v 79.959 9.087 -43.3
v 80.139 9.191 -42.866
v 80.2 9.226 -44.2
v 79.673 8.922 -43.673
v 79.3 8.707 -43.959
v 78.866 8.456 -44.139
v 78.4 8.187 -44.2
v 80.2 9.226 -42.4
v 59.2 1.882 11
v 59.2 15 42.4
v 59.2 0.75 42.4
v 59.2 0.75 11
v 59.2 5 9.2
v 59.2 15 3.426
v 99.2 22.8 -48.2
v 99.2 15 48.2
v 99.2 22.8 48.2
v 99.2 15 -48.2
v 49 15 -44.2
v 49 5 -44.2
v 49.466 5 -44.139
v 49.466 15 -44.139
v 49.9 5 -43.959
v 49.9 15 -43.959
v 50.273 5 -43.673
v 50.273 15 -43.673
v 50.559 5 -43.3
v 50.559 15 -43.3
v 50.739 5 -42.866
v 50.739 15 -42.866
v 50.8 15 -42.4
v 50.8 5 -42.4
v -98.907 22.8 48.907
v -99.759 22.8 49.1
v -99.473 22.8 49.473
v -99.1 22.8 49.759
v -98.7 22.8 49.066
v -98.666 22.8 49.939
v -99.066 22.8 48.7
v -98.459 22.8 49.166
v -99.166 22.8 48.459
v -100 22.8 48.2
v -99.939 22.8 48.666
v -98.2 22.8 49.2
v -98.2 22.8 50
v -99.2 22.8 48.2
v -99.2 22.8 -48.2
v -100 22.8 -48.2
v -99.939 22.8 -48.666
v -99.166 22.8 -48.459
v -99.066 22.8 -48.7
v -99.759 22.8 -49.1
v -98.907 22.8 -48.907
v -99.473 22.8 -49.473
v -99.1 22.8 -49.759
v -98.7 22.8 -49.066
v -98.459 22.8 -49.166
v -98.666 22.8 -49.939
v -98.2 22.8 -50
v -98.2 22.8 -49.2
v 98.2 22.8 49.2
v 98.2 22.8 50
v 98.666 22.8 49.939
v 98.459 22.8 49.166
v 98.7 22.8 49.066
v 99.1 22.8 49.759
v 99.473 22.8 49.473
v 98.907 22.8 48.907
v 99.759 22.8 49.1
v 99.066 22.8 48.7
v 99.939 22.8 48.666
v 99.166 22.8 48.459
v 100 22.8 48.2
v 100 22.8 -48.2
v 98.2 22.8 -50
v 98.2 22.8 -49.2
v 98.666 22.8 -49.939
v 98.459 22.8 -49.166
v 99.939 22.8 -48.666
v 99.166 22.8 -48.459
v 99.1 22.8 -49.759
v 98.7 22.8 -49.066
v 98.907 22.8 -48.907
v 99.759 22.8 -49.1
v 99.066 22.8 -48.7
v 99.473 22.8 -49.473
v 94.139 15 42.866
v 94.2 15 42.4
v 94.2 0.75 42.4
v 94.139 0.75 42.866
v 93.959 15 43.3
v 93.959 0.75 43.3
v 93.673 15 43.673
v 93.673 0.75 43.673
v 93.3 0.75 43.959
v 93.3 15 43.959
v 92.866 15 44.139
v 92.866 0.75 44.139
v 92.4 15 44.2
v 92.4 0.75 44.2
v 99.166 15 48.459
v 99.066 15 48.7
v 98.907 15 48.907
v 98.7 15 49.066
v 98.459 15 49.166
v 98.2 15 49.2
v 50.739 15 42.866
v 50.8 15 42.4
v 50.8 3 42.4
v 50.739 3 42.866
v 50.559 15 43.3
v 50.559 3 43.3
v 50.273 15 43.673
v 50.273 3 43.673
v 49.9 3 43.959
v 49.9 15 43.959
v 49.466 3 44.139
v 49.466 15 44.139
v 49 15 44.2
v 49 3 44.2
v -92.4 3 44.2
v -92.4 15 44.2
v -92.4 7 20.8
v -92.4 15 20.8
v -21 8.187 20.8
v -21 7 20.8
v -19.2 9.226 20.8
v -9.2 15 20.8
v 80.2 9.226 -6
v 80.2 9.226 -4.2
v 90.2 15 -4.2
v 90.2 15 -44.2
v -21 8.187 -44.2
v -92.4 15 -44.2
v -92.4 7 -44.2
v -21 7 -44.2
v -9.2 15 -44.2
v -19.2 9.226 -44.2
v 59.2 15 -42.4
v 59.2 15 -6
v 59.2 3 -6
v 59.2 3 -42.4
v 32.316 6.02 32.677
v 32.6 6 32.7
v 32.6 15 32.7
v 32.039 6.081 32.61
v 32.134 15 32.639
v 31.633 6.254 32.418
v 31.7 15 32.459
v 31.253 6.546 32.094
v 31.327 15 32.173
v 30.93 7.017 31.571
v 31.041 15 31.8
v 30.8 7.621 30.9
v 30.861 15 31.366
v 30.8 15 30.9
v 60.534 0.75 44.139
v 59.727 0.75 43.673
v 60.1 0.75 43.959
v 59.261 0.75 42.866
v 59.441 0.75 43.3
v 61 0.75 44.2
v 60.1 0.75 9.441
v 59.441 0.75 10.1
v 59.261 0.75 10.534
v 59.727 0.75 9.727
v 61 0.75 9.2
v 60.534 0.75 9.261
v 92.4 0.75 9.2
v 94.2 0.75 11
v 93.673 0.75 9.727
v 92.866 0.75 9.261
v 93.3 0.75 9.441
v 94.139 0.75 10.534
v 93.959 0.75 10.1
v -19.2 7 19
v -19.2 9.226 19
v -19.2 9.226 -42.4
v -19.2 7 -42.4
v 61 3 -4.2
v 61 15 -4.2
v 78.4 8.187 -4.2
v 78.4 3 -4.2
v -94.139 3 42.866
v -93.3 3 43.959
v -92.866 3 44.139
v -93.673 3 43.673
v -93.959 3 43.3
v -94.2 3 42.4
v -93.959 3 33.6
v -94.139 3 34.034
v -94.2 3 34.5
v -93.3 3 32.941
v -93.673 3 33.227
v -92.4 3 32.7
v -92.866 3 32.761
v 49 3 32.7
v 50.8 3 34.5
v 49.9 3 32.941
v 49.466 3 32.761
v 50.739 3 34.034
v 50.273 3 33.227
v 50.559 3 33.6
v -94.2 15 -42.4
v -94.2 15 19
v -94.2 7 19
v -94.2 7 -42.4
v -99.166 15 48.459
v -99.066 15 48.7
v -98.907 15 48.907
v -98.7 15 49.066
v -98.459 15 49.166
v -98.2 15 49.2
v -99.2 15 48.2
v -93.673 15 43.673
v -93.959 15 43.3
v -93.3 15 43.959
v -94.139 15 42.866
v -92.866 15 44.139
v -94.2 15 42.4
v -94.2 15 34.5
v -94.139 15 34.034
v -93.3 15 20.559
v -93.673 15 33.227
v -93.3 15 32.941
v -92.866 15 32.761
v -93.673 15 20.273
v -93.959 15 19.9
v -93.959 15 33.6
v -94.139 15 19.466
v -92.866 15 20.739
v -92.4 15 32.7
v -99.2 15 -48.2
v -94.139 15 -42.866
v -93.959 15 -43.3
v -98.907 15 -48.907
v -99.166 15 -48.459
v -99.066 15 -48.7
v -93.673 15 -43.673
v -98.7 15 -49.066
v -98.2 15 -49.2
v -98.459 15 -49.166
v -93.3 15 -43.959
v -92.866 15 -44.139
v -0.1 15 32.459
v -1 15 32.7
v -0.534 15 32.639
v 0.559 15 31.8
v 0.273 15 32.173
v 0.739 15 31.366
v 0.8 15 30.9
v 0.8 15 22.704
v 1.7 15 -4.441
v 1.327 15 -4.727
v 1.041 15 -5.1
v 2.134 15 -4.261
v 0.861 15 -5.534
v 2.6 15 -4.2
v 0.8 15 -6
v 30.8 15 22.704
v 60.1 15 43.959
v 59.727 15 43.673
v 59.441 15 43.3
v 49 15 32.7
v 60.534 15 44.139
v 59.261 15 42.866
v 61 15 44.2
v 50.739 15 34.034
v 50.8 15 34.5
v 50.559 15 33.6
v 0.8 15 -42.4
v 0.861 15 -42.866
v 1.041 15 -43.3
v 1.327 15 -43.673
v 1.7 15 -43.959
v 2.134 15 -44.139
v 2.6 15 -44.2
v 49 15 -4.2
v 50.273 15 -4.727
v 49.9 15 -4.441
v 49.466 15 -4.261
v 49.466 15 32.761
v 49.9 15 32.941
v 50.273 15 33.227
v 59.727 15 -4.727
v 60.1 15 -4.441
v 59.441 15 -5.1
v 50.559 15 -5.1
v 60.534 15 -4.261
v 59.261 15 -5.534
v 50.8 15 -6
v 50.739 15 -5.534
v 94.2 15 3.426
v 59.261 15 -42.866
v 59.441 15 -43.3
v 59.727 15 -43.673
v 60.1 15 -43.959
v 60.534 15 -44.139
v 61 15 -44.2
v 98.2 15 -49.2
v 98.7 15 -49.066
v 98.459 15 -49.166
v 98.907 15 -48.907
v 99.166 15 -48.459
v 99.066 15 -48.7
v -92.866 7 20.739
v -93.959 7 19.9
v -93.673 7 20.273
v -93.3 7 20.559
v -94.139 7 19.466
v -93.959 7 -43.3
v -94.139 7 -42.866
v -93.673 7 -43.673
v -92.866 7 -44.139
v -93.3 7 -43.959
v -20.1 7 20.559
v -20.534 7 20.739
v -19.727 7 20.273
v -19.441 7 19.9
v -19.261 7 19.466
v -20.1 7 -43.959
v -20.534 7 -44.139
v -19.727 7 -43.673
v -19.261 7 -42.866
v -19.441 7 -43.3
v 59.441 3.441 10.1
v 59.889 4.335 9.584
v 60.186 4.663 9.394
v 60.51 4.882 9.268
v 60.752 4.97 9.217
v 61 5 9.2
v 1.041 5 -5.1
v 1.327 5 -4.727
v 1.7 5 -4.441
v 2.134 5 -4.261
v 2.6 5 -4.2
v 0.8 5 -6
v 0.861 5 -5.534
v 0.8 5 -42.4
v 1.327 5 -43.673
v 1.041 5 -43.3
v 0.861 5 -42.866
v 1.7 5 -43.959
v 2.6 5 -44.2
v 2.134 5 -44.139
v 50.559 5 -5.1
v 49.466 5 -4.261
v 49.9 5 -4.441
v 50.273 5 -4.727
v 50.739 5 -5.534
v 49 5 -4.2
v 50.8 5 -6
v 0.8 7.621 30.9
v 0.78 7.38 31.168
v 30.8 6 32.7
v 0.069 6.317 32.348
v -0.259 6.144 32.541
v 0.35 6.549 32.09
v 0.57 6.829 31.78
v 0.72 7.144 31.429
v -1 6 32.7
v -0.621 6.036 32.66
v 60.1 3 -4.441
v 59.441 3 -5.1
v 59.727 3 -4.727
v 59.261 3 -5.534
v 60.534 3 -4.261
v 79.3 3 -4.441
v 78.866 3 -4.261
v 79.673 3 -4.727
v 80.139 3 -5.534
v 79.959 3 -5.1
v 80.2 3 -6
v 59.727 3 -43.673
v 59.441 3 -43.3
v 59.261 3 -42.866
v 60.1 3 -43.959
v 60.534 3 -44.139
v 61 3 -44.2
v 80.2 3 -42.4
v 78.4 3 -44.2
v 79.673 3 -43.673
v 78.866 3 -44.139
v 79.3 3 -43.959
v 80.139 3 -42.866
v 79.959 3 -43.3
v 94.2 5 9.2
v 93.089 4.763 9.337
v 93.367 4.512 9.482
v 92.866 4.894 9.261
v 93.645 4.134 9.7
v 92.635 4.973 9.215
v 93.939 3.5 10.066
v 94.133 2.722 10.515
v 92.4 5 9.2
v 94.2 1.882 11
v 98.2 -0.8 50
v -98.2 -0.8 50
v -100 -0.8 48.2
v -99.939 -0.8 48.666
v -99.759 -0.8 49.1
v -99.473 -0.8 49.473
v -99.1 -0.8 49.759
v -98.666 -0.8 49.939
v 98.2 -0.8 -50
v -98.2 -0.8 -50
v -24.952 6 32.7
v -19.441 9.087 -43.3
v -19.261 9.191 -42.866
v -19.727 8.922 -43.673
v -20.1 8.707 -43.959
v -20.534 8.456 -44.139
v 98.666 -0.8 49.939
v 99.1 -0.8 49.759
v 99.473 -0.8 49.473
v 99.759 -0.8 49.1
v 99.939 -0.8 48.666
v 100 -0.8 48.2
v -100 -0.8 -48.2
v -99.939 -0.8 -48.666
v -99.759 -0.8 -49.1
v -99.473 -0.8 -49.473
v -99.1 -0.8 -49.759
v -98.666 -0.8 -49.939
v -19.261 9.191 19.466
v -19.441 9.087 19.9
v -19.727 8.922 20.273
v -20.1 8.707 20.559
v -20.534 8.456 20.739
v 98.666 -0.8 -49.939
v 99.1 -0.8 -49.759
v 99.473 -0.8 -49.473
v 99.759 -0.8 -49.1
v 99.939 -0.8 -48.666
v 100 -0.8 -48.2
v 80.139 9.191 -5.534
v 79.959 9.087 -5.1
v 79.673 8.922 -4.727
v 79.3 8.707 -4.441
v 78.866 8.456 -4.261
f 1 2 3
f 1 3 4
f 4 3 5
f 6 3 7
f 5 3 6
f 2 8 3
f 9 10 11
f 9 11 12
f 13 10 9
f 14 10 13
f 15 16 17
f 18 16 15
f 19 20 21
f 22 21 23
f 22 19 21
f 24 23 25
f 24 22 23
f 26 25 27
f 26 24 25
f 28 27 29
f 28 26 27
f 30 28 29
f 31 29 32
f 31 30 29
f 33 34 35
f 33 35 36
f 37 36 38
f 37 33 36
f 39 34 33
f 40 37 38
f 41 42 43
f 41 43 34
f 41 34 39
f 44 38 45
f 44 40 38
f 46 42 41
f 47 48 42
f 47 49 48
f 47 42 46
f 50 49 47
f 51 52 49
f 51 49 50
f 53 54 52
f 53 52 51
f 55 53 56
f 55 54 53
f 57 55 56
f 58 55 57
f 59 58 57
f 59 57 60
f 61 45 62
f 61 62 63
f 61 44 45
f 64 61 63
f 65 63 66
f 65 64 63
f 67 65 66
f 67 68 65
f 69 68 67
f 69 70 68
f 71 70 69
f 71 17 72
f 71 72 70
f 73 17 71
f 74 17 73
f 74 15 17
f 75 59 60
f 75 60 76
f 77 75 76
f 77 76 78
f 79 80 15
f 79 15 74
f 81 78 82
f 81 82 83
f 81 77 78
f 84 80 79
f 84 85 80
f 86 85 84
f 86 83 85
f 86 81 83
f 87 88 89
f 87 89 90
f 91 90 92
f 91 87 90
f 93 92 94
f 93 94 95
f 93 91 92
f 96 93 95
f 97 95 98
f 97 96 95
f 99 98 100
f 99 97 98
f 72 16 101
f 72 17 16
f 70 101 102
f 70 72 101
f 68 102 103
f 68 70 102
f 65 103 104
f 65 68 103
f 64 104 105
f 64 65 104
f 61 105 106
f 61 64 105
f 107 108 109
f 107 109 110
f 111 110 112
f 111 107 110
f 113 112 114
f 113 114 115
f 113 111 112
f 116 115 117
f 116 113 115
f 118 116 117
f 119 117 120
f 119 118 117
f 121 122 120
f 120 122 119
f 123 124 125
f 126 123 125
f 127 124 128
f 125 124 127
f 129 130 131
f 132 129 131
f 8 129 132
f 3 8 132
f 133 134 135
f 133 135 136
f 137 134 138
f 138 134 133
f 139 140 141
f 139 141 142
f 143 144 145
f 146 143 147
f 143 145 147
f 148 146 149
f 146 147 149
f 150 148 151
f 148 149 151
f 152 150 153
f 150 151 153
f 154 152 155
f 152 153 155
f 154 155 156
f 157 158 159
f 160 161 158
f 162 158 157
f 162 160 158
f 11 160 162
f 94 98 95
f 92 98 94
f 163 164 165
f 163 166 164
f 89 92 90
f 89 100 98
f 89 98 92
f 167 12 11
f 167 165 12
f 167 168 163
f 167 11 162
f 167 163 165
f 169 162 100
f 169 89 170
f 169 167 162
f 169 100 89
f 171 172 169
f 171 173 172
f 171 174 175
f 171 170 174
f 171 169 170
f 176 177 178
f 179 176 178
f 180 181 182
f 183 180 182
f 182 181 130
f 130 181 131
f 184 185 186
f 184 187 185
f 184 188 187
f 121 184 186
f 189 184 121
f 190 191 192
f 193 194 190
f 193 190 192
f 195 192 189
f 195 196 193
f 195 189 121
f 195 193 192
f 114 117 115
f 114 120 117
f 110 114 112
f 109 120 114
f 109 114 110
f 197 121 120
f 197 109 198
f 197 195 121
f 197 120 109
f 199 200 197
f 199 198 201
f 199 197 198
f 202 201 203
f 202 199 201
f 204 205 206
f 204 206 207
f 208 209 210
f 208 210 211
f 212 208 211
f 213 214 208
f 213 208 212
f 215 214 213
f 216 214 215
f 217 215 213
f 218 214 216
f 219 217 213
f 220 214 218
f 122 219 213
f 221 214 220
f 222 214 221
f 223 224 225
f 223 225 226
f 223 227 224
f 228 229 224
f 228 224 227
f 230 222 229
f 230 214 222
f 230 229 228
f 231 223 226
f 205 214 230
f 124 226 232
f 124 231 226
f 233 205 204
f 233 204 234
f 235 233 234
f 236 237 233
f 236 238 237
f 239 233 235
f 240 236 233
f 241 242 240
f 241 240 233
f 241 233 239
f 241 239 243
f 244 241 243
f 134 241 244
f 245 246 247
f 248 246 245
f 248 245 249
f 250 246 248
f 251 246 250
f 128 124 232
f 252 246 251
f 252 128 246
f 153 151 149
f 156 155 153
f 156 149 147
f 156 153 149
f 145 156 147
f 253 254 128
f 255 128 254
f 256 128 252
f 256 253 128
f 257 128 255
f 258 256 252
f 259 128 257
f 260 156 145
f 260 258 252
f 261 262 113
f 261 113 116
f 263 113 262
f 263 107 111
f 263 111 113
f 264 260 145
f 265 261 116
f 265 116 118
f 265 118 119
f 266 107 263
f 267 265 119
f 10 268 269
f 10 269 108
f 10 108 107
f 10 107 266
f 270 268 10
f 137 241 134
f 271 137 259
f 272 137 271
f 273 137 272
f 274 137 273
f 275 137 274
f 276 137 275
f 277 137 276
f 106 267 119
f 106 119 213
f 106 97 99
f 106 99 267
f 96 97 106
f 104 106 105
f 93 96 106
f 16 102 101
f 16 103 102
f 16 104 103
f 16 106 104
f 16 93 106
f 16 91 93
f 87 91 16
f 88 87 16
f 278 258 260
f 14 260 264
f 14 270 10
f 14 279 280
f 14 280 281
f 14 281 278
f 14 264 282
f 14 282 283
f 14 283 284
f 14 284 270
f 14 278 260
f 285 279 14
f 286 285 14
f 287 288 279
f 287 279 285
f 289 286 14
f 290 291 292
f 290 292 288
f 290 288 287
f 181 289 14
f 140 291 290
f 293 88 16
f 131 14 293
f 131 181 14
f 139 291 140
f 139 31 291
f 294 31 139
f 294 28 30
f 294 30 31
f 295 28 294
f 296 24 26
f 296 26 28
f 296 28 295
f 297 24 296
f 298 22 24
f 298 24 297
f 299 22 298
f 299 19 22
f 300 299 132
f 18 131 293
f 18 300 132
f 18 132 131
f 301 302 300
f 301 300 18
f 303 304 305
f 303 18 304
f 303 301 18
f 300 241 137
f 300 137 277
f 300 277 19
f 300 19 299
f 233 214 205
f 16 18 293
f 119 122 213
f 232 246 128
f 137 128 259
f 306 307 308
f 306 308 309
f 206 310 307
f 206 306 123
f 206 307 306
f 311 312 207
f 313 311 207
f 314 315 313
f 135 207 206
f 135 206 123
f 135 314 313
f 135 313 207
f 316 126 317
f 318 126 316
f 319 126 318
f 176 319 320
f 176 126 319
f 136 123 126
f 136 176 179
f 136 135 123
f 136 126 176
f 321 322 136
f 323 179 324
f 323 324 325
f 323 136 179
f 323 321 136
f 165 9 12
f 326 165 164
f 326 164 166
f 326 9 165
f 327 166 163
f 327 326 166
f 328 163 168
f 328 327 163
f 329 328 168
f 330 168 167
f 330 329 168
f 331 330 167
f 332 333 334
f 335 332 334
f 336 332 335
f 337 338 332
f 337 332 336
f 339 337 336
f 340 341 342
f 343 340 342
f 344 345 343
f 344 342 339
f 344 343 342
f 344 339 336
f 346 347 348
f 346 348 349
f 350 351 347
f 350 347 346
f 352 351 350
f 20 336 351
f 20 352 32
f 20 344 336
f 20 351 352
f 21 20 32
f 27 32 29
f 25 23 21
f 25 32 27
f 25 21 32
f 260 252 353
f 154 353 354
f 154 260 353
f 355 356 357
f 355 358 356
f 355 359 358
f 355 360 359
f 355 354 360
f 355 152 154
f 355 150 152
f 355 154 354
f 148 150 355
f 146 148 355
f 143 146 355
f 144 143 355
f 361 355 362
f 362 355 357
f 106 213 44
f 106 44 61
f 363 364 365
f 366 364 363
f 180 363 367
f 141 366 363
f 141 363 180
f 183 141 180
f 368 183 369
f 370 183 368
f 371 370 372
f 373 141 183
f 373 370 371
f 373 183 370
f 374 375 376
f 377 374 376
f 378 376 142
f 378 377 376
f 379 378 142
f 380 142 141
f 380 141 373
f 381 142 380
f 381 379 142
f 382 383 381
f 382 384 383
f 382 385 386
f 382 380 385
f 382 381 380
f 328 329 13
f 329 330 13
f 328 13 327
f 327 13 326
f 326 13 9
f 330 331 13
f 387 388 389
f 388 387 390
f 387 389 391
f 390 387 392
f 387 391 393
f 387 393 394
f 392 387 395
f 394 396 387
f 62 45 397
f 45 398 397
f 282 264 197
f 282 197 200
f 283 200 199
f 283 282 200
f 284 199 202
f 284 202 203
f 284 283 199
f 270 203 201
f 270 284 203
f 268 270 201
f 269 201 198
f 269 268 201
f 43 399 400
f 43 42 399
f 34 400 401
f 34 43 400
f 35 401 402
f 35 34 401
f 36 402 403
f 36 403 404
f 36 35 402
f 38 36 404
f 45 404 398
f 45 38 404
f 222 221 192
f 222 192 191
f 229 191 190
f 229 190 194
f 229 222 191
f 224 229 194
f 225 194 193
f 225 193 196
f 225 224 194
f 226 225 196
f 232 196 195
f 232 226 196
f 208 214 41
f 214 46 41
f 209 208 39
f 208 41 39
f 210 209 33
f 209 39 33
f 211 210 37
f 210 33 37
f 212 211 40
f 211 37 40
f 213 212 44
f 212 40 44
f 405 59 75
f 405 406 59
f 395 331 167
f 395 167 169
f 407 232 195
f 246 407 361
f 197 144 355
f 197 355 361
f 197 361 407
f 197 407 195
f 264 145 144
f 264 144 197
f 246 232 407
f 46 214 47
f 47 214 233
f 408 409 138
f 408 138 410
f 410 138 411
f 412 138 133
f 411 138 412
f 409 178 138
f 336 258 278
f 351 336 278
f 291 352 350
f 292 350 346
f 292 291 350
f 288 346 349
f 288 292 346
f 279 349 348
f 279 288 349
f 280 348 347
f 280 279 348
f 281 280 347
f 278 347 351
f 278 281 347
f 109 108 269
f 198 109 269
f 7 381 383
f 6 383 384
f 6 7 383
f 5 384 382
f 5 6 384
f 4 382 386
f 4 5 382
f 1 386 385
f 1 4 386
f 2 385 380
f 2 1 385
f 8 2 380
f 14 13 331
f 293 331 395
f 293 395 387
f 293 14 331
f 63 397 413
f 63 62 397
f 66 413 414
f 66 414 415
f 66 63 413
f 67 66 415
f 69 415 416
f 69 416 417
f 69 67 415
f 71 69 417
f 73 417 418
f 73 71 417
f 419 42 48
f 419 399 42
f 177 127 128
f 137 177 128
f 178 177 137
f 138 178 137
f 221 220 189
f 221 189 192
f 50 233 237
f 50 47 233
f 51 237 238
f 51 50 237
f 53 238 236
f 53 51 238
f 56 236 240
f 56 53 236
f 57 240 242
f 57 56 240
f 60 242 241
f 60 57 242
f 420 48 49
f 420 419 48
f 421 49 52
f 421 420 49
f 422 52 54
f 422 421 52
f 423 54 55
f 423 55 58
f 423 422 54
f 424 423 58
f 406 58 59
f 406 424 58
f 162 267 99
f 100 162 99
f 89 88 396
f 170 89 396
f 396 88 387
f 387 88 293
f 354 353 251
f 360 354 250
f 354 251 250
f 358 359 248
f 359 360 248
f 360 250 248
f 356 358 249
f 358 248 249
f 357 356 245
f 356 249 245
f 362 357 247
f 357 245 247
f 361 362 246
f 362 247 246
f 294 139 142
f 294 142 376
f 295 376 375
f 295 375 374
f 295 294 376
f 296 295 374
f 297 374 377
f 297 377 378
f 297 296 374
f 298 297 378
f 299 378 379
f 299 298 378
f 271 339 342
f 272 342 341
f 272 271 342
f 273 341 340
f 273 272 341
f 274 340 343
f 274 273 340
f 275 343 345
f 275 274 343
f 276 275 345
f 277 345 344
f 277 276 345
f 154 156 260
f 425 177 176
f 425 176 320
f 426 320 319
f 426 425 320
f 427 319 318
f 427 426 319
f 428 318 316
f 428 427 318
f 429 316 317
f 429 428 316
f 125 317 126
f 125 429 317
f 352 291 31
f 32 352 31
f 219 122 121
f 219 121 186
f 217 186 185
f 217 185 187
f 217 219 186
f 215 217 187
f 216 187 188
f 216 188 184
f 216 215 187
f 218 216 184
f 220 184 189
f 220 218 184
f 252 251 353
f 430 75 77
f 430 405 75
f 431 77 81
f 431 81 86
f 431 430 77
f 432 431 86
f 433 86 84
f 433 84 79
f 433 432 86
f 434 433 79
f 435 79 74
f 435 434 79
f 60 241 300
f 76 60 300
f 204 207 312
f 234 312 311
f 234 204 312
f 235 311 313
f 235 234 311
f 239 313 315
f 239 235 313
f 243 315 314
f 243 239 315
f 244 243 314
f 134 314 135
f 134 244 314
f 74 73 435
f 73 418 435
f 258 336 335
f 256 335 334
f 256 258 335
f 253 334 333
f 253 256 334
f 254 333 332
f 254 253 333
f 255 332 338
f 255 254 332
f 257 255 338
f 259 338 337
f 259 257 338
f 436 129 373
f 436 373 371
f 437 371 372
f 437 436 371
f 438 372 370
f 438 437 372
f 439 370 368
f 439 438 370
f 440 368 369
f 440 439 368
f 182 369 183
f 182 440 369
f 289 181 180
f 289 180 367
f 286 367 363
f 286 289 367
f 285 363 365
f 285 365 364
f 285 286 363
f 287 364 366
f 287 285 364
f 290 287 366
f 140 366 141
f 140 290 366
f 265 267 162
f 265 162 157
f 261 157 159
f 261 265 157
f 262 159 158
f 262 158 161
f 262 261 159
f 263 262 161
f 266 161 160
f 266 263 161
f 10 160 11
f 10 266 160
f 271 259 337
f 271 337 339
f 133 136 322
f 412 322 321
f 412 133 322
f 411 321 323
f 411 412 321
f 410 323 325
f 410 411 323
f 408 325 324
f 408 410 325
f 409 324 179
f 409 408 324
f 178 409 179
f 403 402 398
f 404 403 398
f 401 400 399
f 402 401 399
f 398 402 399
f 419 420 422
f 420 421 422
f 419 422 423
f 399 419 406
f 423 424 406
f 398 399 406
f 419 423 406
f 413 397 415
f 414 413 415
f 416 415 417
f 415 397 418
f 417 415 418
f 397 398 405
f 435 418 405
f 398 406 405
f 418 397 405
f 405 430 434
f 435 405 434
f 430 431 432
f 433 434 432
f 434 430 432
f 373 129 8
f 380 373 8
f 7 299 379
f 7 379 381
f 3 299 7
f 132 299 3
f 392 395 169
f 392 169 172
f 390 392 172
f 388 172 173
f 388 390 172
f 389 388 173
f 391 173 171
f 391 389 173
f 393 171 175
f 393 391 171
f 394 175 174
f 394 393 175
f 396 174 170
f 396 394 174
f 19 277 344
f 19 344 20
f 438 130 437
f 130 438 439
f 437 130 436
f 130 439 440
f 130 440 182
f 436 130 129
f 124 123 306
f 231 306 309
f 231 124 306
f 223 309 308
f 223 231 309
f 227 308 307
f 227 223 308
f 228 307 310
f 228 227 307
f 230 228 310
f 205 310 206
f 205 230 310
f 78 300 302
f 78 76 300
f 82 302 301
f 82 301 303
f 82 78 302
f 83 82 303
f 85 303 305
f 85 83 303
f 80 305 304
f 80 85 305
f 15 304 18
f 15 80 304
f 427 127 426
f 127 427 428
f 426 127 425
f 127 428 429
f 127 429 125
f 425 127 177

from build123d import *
from OCP.BRepFilletAPI import BRepFilletAPI_MakeChamfer

# Parameters (mm, degrees)
SKETCH1_W           = 200
SKETCH1_H           = 100
BOSS_EXTRUDE1_DEPTH = 0.8
SKETCH2_W           = 200
SKETCH2_H           = 100
SKETCH2_W_2         = 198.4
SKETCH2_H_2         = 98.4
BOSS_EXTRUDE2_DEPTH = 15
SKETCH3_W           = 145
SKETCH3_H           = 11.5
BLENDER_DEPTH       = 12
SKETCH3_3_W         = 75
SKETCH3_3_H         = 65
CHARCOALS_DEPTH     = 8
SKETCH3_4_W         = 50
SKETCH3_4_H         = 40
RUBBER_DEPTH        = 10
SKETCH3_5_W         = 21
SKETCH3_5_H         = 40
ERASER_DEPTH        = 12
SKETCH3_6_W         = 35
SKETCH3_6_H         = 35
SHARPENER_DEPTH     = 14.25
CHAMFER1_SIZE       = 10
CHAMFER1_SIZE2      = 5.773502692
SKETCH3_7_W         = 30
SKETCH3_7_H         = 10
CUT_EXTRUDE6_DEPTH  = 9
CHAMFER2_SIZE       = 9.004040443
CHAMFER2_SIZE_2     = 10
SKETCH4_W           = 200
SKETCH4_H           = 100
SKETCH4_W_2         = 198.4
SKETCH4_H_2         = 98.4
BOSS_EXTRUDE3_DEPTH = 7.8
FILLET1_R           = 1
FILLET2_R           = 1.8
FILLET3_R           = 1.8


with BuildPart() as part:
    # Sketch1 → Boss-Extrude1 (new body)
    with BuildSketch(Plane(origin=(0, 0, 0), x_dir=(1, 0, 0), z_dir=(0, 1, 0))):
        Rectangle(SKETCH1_W, SKETCH1_H)
    extrude(amount=-BOSS_EXTRUDE1_DEPTH)

    # Sketch2 → Boss-Extrude2 (add)
    # profile 1 of 2: a face of its own
    with BuildSketch(Plane(origin=(0, 0, 0), x_dir=(1, 0, 0), z_dir=(0, 1, 0))):
        Rectangle(SKETCH2_W, SKETCH2_H)
        Rectangle(SKETCH2_W_2, SKETCH2_H_2, mode=Mode.SUBTRACT)
    # profile 2 of 2: a face of its own
    with BuildSketch(Plane(origin=(0, 0, 0), x_dir=(1, 0, 0), z_dir=(0, 1, 0))):
        Rectangle(SKETCH2_W_2, SKETCH2_H_2)
    extrude(amount=BOSS_EXTRUDE2_DEPTH)

    # Sketch3 → Blender (cut)
    with BuildSketch(Plane(origin=(0, 15, 0), x_dir=(1, 0, 0), z_dir=(0, 1, 0))):
        with Locations((-21.7, -38.45)):
            Rectangle(SKETCH3_W, SKETCH3_H)
    extrude(amount=-BLENDER_DEPTH, mode=Mode.SUBTRACT)

    # Sketch3<3> → Charcoals (cut)
    with BuildSketch(Plane(origin=(0, 15, 0), x_dir=(1, 0, 0), z_dir=(0, 1, 0))):
        with Locations((-56.7, 11.7)):
            Rectangle(SKETCH3_3_W, SKETCH3_3_H)
    extrude(amount=-CHARCOALS_DEPTH, mode=Mode.SUBTRACT)

    # Sketch3<4> → Rubber (cut)
    with BuildSketch(Plane(origin=(0, 15, 0), x_dir=(1, 0, 0), z_dir=(0, 1, 0))):
        with Locations((25.8, 24.2)):
            Rectangle(SKETCH3_4_W, SKETCH3_4_H)
    extrude(amount=-RUBBER_DEPTH, mode=Mode.SUBTRACT)

    # Sketch3<5> → Eraser (cut)
    with BuildSketch(Plane(origin=(0, 15, 0), x_dir=(1, 0, 0), z_dir=(0, 1, 0))):
        with Locations((69.7, 24.2)):
            Rectangle(SKETCH3_5_W, SKETCH3_5_H)
    extrude(amount=-ERASER_DEPTH, mode=Mode.SUBTRACT)

    # Sketch3<6> → Sharpener (cut)
    with BuildSketch(Plane(origin=(0, 15, 0), x_dir=(1, 0, 0), z_dir=(0, 1, 0))):
        with Locations((76.7, -26.7)):
            Rectangle(SKETCH3_6_W, SKETCH3_6_H)
    extrude(amount=-SHARPENER_DEPTH, mode=Mode.SUBTRACT)

    # Chamfer1: one chamfer whose edges measure the first distance from different faces: ONE call of the kernel's chamfer builder (chamfer() names one face for all edges)
    chamfer1_edges_1 = [part.edges().sort_by_distance(p)[0] for p in [
        (-19.2, 15, -11.7),
        (80.2, 15, -24.2),
    ]]
    chamfer1_side_1 = [part.faces().sort_by_distance(p)[0] for p in [
        (11.550891669, 15, 3.081461272),
    ]]
    chamfer1_edges_2 = [part.edges().sort_by_distance(p)[0] for p in [
        (76.7, 15, 9.2),
    ]]
    chamfer1_side_2 = [part.faces().sort_by_distance(p)[0] for p in [
        (76.7, 7.875, 9.2),
    ]]
    chamfer1 = BRepFilletAPI_MakeChamfer(part.part.solid().wrapped)
    for e in chamfer1_edges_1:
        chamfer1.Add(CHAMFER1_SIZE, CHAMFER1_SIZE2, e.wrapped, chamfer1_side_1[0].wrapped)  # the first distance lies on this face
    for e in chamfer1_edges_2:
        chamfer1.Add(CHAMFER1_SIZE, CHAMFER1_SIZE2, e.wrapped, chamfer1_side_2[0].wrapped)  # the first distance lies on this face
    add(Compound.cast(chamfer1.Shape()), mode=Mode.REPLACE)

    # Sketch3<7> → Cut-Extrude6 (cut)
    with BuildSketch(Plane(origin=(0, 15, 0), x_dir=(1, 0, 0), z_dir=(0, 1, 0))):
        with Locations((15.8, -27.7)):
            Rectangle(SKETCH3_7_W, SKETCH3_7_H)
    extrude(amount=-CUT_EXTRUDE6_DEPTH, mode=Mode.SUBTRACT)

    # Chamfer2
    # the kernel refuses this chamfer: 10, 9.004040443 mm, written as the material it adds along each edge
    with BuildSketch(Plane(origin=(56.551839571, 6, 22.7), x_dir=(0, 0.9994864482690294, -0.032044340008195435), z_dir=(-1, 0, 0))) as chamfer2_piece_1_section:
        Polygon((CHAMFER2_SIZE * 0.999486448267, -CHAMFER2_SIZE * 0.0320443400081), (-CHAMFER2_SIZE_2 * 0.0320443400082, -CHAMFER2_SIZE_2 * 0.999486448269), (0, 0), align=None)
    chamfer2_piece_1 = extrude(amount=81.503679141, mode=Mode.PRIVATE)
    chamfer2_piece_1 = split(chamfer2_piece_1, bisect_by=Plane(origin=(15.8, 15, 26.033334004), z_dir=(0, -1, 0)), keep=Keep.TOP, mode=Mode.PRIVATE)
    add(chamfer2_piece_1)

    # Sketch4 → Boss-Extrude3 (add)
    with BuildSketch(Plane(origin=(0, 15, 0), x_dir=(1, 0, 0), z_dir=(0, 1, 0))):
        Rectangle(SKETCH4_W, SKETCH4_H)
        Rectangle(SKETCH4_W_2, SKETCH4_H_2, mode=Mode.SUBTRACT)
    extrude(amount=BOSS_EXTRUDE3_DEPTH)

    # Fillet1
    fillet1_edges = [part.edges().sort_by_distance(p)[0] for p in [
        (-99.2, 18.9, -49.2),
        (-99.2, 18.9, 49.2),
        (99.2, 18.9, 49.2),
        (99.2, 18.9, -49.2),
    ]]
    fillet(fillet1_edges, radius=FILLET1_R)

    # Fillet2
    fillet2_edges = [part.edges().sort_by_distance(p)[0] for p in [
        (-100, 11, -50),
        (100, 11, -50),
        (100, 11, 50),
        (-100, 11, 50),
    ]]
    fillet(fillet2_edges, radius=FILLET2_R)

    # Fillet3
    # the kernel refuses this fillet: 1.8 mm, written as the material it adds along each edge
    with BuildSketch(Plane(origin=(50.8, 15, 44.2), x_dir=(0, 0, -1), z_dir=(0, -1, 0)), Plane(origin=(50.8, 15, 32.7), x_dir=(-1, 0, 0), z_dir=(0, -1, 0)), Plane(origin=(59.2, 15, -4.2), x_dir=(1, 0, 0), z_dir=(0, -1, 0))) as fillet3_piece_1:
        with BuildLine():
            CenterArc((FILLET3_R, -FILLET3_R), FILLET3_R, 90, 90)
            Line((0, -FILLET3_R), (0, 0))
            Line((0, 0), (FILLET3_R, 0))
        make_face()
    extrude(amount=12)
    with BuildSketch(Plane(origin=(-94.2, 15, 44.2), x_dir=(0, 0, -1), z_dir=(0, -1, 0)), Plane(origin=(-94.2, 15, 32.7), x_dir=(1, 0, 0), z_dir=(0, -1, 0)), Plane(origin=(59.2, 15, -44.2), x_dir=(1, 0, 0), z_dir=(0, -1, 0))) as fillet3_piece_2:
        with BuildLine():
            CenterArc((FILLET3_R, FILLET3_R), FILLET3_R, 180, 90)
            Line((0, FILLET3_R), (0, 0))
            Line((0, 0), (FILLET3_R, 0))
        make_face()
    extrude(amount=12)
    with BuildSketch(Plane(origin=(-19.2, 13.726497308, 20.8), x_dir=(-1, 0, 0), z_dir=(0, -1, 0))) as fillet3_piece_3_section:
        with BuildLine():
            CenterArc((FILLET3_R, FILLET3_R), FILLET3_R, 180, 90)
            Line((0, FILLET3_R), (0, 0))
            Line((0, 0), (FILLET3_R, 0))
        make_face()
    fillet3_piece_3 = extrude(amount=11.226497308, mode=Mode.PRIVATE)
    fillet3_piece_3 = split(fillet3_piece_3, bisect_by=Plane(origin=(-20.005000388, 8.761730117, 20.378537809), z_dir=(0.5000000000000009, -0.8660254037844382, 0)), keep=Keep.TOP, mode=Mode.PRIVATE)
    add(fillet3_piece_3)
    with BuildSketch(Plane(origin=(-94.2, 15, 20.8), x_dir=(1, 0, 0), z_dir=(0, -1, 0)), Plane(origin=(-94.2, 15, -44.2), x_dir=(0, 0, 1), z_dir=(0, -1, 0))) as fillet3_piece_4:
        with BuildLine():
            CenterArc((FILLET3_R, -FILLET3_R), FILLET3_R, 90, 90)
            Line((0, -FILLET3_R), (0, 0))
            Line((0, 0), (FILLET3_R, 0))
        make_face()
    extrude(amount=12.5)
    with BuildSketch(Plane(origin=(-19.2, 13.726497308, -44.2), x_dir=(-1, 0, 0), z_dir=(0, -1, 0))) as fillet3_piece_5_section:
        with BuildLine():
            CenterArc((FILLET3_R, -FILLET3_R), FILLET3_R, 90, 90)
            Line((0, -FILLET3_R), (0, 0))
            Line((0, 0), (FILLET3_R, 0))
        make_face()
    fillet3_piece_5 = extrude(amount=11.226497308, mode=Mode.PRIVATE)
    fillet3_piece_5 = split(fillet3_piece_5, bisect_by=Plane(origin=(-20.005000388, 8.761730117, -43.778537809), z_dir=(0.5000000000000009, -0.8660254037844382, 0)), keep=Keep.TOP, mode=Mode.PRIVATE)
    add(fillet3_piece_5)
    with BuildSketch(Plane(origin=(50.8, 15, -4.2), x_dir=(-1, 0, 0), z_dir=(0, -1, 0)), Plane(origin=(50.8, 15, -44.2), x_dir=(0, 0, 1), z_dir=(0, -1, 0))) as fillet3_piece_6:
        with BuildLine():
            CenterArc((FILLET3_R, FILLET3_R), FILLET3_R, 180, 90)
            Line((0, FILLET3_R), (0, 0))
            Line((0, 0), (FILLET3_R, 0))
        make_face()
    extrude(amount=14.5)
    with BuildSketch(Plane(origin=(0.8, 15, -4.2), x_dir=(1, 0, 0), z_dir=(0, -1, 0)), Plane(origin=(0.8, 15, -44.2), x_dir=(0, 0, 1), z_dir=(0, -1, 0))) as fillet3_piece_7:
        with BuildLine():
            CenterArc((FILLET3_R, -FILLET3_R), FILLET3_R, 90, 90)
            Line((0, -FILLET3_R), (0, 0))
            Line((0, 0), (FILLET3_R, 0))
        make_face()
    extrude(amount=14.5)
    with BuildSketch(Plane(origin=(80.2, 13.726497308, -4.2), x_dir=(-1, 0, 0), z_dir=(0, -1, 0))) as fillet3_piece_8_section:
        with BuildLine():
            CenterArc((FILLET3_R, FILLET3_R), FILLET3_R, 180, 90)
            Line((0, FILLET3_R), (0, 0))
            Line((0, 0), (FILLET3_R, 0))
        make_face()
    fillet3_piece_8 = extrude(amount=10.726497308, mode=Mode.PRIVATE)
    fillet3_piece_8 = split(fillet3_piece_8, bisect_by=Plane(origin=(78.509719514, 8.250613415, -4.608516769), z_dir=(0.5000000000000009, -0.8660254037844382, 0)), keep=Keep.TOP, mode=Mode.PRIVATE)
    add(fillet3_piece_8)
    with BuildSketch(Plane(origin=(80.2, 13.726497308, -44.2), x_dir=(-1, 0, 0), z_dir=(0, -1, 0))) as fillet3_piece_9_section:
        with BuildLine():
            CenterArc((FILLET3_R, -FILLET3_R), FILLET3_R, 90, 90)
            Line((0, -FILLET3_R), (0, 0))
            Line((0, 0), (FILLET3_R, 0))
        make_face()
    fillet3_piece_9 = extrude(amount=10.726497308, mode=Mode.PRIVATE)
    fillet3_piece_9 = split(fillet3_piece_9, bisect_by=Plane(origin=(78.509719514, 8.250613415, -43.791483231), z_dir=(0.5000000000000009, -0.8660254037844382, 0)), keep=Keep.TOP, mode=Mode.PRIVATE)
    add(fillet3_piece_9)
    with BuildSketch(Plane(origin=(94.2, 9.5, 9.2), x_dir=(0, 0, 1), z_dir=(0, -1, 0))) as fillet3_piece_10_section:
        with BuildLine():
            CenterArc((FILLET3_R, FILLET3_R), FILLET3_R, 180, 90)
            Line((0, FILLET3_R), (0, 0))
            Line((0, 0), (FILLET3_R, 0))
        make_face()
    fillet3_piece_10 = extrude(amount=8.75, mode=Mode.PRIVATE)
    fillet3_piece_10 = split(fillet3_piece_10, bisect_by=Plane(origin=(93.765274696, 3.031109619, 10.336739391), z_dir=(0, -0.500000000000001, -0.866025403784438)), keep=Keep.TOP, mode=Mode.PRIVATE)
    add(fillet3_piece_10)
    with BuildSketch(Plane(origin=(94.2, 15, 44.2), x_dir=(-1, 0, 0), z_dir=(0, -1, 0)), Plane(origin=(59.2, 15, 44.2), x_dir=(0, 0, -1), z_dir=(0, -1, 0))) as fillet3_piece_11:
        with BuildLine():
            CenterArc((FILLET3_R, FILLET3_R), FILLET3_R, 180, 90)
            Line((0, FILLET3_R), (0, 0))
            Line((0, 0), (FILLET3_R, 0))
        make_face()
    extrude(amount=14.25)
    with BuildSketch(Plane(origin=(59.2, 9.5, 9.2), x_dir=(0, 0, 1), z_dir=(0, -1, 0))) as fillet3_piece_12_section:
        with BuildLine():
            CenterArc((FILLET3_R, -FILLET3_R), FILLET3_R, 90, 90)
            Line((0, -FILLET3_R), (0, 0))
            Line((0, 0), (FILLET3_R, 0))
        make_face()
    fillet3_piece_12 = extrude(amount=8.75, mode=Mode.PRIVATE)
    fillet3_piece_12 = split(fillet3_piece_12, bisect_by=Plane(origin=(59.634725304, 3.031109619, 10.336739391), z_dir=(0, -0.500000000000001, -0.866025403784438)), keep=Keep.TOP, mode=Mode.PRIVATE)
    add(fillet3_piece_12)
    # the kernel refuses this fillet: 1.8 mm, written as the material it takes off along each edge
    with BuildSketch(Plane(origin=(0.8, 19.5, 32.7), x_dir=(0, 0, -1), z_dir=(0, -1, 0))) as fillet3_2_piece_1_section:
        with BuildLine():
            CenterArc((FILLET3_R, -FILLET3_R), FILLET3_R, 90, 90)
            Line((0, -FILLET3_R), (0, 0))
            Line((0, 0), (FILLET3_R, 0))
        make_face()
    fillet3_2_piece_1 = extrude(amount=18, mode=Mode.PRIVATE)
    fillet3_2_piece_1 = split(fillet3_2_piece_1, bisect_by=Plane(origin=(0.390952326, 8.287487107, 30.159488191), z_dir=(0, 0.7431448254771393, 0.6691306063591413)), keep=Keep.TOP, mode=Mode.PRIVATE)
    add(fillet3_2_piece_1, mode=Mode.SUBTRACT)
    with BuildSketch(Plane(origin=(30.8, 19.5, 32.7), x_dir=(1, 0, 0), z_dir=(0, -1, 0))) as fillet3_2_piece_2_section:
        with BuildLine():
            CenterArc((FILLET3_R, -FILLET3_R), FILLET3_R, 90, 90)
            Line((0, -FILLET3_R), (0, 0))
            Line((0, 0), (FILLET3_R, 0))
        make_face()
    fillet3_2_piece_2 = extrude(amount=18, mode=Mode.PRIVATE)
    fillet3_2_piece_2 = split(fillet3_2_piece_2, bisect_by=Plane(origin=(31.209047674, 8.287487107, 30.159488191), z_dir=(0, 0.7431448254771393, 0.6691306063591413)), keep=Keep.TOP, mode=Mode.PRIVATE)
    add(fillet3_2_piece_2, mode=Mode.SUBTRACT)


solid = part.part
